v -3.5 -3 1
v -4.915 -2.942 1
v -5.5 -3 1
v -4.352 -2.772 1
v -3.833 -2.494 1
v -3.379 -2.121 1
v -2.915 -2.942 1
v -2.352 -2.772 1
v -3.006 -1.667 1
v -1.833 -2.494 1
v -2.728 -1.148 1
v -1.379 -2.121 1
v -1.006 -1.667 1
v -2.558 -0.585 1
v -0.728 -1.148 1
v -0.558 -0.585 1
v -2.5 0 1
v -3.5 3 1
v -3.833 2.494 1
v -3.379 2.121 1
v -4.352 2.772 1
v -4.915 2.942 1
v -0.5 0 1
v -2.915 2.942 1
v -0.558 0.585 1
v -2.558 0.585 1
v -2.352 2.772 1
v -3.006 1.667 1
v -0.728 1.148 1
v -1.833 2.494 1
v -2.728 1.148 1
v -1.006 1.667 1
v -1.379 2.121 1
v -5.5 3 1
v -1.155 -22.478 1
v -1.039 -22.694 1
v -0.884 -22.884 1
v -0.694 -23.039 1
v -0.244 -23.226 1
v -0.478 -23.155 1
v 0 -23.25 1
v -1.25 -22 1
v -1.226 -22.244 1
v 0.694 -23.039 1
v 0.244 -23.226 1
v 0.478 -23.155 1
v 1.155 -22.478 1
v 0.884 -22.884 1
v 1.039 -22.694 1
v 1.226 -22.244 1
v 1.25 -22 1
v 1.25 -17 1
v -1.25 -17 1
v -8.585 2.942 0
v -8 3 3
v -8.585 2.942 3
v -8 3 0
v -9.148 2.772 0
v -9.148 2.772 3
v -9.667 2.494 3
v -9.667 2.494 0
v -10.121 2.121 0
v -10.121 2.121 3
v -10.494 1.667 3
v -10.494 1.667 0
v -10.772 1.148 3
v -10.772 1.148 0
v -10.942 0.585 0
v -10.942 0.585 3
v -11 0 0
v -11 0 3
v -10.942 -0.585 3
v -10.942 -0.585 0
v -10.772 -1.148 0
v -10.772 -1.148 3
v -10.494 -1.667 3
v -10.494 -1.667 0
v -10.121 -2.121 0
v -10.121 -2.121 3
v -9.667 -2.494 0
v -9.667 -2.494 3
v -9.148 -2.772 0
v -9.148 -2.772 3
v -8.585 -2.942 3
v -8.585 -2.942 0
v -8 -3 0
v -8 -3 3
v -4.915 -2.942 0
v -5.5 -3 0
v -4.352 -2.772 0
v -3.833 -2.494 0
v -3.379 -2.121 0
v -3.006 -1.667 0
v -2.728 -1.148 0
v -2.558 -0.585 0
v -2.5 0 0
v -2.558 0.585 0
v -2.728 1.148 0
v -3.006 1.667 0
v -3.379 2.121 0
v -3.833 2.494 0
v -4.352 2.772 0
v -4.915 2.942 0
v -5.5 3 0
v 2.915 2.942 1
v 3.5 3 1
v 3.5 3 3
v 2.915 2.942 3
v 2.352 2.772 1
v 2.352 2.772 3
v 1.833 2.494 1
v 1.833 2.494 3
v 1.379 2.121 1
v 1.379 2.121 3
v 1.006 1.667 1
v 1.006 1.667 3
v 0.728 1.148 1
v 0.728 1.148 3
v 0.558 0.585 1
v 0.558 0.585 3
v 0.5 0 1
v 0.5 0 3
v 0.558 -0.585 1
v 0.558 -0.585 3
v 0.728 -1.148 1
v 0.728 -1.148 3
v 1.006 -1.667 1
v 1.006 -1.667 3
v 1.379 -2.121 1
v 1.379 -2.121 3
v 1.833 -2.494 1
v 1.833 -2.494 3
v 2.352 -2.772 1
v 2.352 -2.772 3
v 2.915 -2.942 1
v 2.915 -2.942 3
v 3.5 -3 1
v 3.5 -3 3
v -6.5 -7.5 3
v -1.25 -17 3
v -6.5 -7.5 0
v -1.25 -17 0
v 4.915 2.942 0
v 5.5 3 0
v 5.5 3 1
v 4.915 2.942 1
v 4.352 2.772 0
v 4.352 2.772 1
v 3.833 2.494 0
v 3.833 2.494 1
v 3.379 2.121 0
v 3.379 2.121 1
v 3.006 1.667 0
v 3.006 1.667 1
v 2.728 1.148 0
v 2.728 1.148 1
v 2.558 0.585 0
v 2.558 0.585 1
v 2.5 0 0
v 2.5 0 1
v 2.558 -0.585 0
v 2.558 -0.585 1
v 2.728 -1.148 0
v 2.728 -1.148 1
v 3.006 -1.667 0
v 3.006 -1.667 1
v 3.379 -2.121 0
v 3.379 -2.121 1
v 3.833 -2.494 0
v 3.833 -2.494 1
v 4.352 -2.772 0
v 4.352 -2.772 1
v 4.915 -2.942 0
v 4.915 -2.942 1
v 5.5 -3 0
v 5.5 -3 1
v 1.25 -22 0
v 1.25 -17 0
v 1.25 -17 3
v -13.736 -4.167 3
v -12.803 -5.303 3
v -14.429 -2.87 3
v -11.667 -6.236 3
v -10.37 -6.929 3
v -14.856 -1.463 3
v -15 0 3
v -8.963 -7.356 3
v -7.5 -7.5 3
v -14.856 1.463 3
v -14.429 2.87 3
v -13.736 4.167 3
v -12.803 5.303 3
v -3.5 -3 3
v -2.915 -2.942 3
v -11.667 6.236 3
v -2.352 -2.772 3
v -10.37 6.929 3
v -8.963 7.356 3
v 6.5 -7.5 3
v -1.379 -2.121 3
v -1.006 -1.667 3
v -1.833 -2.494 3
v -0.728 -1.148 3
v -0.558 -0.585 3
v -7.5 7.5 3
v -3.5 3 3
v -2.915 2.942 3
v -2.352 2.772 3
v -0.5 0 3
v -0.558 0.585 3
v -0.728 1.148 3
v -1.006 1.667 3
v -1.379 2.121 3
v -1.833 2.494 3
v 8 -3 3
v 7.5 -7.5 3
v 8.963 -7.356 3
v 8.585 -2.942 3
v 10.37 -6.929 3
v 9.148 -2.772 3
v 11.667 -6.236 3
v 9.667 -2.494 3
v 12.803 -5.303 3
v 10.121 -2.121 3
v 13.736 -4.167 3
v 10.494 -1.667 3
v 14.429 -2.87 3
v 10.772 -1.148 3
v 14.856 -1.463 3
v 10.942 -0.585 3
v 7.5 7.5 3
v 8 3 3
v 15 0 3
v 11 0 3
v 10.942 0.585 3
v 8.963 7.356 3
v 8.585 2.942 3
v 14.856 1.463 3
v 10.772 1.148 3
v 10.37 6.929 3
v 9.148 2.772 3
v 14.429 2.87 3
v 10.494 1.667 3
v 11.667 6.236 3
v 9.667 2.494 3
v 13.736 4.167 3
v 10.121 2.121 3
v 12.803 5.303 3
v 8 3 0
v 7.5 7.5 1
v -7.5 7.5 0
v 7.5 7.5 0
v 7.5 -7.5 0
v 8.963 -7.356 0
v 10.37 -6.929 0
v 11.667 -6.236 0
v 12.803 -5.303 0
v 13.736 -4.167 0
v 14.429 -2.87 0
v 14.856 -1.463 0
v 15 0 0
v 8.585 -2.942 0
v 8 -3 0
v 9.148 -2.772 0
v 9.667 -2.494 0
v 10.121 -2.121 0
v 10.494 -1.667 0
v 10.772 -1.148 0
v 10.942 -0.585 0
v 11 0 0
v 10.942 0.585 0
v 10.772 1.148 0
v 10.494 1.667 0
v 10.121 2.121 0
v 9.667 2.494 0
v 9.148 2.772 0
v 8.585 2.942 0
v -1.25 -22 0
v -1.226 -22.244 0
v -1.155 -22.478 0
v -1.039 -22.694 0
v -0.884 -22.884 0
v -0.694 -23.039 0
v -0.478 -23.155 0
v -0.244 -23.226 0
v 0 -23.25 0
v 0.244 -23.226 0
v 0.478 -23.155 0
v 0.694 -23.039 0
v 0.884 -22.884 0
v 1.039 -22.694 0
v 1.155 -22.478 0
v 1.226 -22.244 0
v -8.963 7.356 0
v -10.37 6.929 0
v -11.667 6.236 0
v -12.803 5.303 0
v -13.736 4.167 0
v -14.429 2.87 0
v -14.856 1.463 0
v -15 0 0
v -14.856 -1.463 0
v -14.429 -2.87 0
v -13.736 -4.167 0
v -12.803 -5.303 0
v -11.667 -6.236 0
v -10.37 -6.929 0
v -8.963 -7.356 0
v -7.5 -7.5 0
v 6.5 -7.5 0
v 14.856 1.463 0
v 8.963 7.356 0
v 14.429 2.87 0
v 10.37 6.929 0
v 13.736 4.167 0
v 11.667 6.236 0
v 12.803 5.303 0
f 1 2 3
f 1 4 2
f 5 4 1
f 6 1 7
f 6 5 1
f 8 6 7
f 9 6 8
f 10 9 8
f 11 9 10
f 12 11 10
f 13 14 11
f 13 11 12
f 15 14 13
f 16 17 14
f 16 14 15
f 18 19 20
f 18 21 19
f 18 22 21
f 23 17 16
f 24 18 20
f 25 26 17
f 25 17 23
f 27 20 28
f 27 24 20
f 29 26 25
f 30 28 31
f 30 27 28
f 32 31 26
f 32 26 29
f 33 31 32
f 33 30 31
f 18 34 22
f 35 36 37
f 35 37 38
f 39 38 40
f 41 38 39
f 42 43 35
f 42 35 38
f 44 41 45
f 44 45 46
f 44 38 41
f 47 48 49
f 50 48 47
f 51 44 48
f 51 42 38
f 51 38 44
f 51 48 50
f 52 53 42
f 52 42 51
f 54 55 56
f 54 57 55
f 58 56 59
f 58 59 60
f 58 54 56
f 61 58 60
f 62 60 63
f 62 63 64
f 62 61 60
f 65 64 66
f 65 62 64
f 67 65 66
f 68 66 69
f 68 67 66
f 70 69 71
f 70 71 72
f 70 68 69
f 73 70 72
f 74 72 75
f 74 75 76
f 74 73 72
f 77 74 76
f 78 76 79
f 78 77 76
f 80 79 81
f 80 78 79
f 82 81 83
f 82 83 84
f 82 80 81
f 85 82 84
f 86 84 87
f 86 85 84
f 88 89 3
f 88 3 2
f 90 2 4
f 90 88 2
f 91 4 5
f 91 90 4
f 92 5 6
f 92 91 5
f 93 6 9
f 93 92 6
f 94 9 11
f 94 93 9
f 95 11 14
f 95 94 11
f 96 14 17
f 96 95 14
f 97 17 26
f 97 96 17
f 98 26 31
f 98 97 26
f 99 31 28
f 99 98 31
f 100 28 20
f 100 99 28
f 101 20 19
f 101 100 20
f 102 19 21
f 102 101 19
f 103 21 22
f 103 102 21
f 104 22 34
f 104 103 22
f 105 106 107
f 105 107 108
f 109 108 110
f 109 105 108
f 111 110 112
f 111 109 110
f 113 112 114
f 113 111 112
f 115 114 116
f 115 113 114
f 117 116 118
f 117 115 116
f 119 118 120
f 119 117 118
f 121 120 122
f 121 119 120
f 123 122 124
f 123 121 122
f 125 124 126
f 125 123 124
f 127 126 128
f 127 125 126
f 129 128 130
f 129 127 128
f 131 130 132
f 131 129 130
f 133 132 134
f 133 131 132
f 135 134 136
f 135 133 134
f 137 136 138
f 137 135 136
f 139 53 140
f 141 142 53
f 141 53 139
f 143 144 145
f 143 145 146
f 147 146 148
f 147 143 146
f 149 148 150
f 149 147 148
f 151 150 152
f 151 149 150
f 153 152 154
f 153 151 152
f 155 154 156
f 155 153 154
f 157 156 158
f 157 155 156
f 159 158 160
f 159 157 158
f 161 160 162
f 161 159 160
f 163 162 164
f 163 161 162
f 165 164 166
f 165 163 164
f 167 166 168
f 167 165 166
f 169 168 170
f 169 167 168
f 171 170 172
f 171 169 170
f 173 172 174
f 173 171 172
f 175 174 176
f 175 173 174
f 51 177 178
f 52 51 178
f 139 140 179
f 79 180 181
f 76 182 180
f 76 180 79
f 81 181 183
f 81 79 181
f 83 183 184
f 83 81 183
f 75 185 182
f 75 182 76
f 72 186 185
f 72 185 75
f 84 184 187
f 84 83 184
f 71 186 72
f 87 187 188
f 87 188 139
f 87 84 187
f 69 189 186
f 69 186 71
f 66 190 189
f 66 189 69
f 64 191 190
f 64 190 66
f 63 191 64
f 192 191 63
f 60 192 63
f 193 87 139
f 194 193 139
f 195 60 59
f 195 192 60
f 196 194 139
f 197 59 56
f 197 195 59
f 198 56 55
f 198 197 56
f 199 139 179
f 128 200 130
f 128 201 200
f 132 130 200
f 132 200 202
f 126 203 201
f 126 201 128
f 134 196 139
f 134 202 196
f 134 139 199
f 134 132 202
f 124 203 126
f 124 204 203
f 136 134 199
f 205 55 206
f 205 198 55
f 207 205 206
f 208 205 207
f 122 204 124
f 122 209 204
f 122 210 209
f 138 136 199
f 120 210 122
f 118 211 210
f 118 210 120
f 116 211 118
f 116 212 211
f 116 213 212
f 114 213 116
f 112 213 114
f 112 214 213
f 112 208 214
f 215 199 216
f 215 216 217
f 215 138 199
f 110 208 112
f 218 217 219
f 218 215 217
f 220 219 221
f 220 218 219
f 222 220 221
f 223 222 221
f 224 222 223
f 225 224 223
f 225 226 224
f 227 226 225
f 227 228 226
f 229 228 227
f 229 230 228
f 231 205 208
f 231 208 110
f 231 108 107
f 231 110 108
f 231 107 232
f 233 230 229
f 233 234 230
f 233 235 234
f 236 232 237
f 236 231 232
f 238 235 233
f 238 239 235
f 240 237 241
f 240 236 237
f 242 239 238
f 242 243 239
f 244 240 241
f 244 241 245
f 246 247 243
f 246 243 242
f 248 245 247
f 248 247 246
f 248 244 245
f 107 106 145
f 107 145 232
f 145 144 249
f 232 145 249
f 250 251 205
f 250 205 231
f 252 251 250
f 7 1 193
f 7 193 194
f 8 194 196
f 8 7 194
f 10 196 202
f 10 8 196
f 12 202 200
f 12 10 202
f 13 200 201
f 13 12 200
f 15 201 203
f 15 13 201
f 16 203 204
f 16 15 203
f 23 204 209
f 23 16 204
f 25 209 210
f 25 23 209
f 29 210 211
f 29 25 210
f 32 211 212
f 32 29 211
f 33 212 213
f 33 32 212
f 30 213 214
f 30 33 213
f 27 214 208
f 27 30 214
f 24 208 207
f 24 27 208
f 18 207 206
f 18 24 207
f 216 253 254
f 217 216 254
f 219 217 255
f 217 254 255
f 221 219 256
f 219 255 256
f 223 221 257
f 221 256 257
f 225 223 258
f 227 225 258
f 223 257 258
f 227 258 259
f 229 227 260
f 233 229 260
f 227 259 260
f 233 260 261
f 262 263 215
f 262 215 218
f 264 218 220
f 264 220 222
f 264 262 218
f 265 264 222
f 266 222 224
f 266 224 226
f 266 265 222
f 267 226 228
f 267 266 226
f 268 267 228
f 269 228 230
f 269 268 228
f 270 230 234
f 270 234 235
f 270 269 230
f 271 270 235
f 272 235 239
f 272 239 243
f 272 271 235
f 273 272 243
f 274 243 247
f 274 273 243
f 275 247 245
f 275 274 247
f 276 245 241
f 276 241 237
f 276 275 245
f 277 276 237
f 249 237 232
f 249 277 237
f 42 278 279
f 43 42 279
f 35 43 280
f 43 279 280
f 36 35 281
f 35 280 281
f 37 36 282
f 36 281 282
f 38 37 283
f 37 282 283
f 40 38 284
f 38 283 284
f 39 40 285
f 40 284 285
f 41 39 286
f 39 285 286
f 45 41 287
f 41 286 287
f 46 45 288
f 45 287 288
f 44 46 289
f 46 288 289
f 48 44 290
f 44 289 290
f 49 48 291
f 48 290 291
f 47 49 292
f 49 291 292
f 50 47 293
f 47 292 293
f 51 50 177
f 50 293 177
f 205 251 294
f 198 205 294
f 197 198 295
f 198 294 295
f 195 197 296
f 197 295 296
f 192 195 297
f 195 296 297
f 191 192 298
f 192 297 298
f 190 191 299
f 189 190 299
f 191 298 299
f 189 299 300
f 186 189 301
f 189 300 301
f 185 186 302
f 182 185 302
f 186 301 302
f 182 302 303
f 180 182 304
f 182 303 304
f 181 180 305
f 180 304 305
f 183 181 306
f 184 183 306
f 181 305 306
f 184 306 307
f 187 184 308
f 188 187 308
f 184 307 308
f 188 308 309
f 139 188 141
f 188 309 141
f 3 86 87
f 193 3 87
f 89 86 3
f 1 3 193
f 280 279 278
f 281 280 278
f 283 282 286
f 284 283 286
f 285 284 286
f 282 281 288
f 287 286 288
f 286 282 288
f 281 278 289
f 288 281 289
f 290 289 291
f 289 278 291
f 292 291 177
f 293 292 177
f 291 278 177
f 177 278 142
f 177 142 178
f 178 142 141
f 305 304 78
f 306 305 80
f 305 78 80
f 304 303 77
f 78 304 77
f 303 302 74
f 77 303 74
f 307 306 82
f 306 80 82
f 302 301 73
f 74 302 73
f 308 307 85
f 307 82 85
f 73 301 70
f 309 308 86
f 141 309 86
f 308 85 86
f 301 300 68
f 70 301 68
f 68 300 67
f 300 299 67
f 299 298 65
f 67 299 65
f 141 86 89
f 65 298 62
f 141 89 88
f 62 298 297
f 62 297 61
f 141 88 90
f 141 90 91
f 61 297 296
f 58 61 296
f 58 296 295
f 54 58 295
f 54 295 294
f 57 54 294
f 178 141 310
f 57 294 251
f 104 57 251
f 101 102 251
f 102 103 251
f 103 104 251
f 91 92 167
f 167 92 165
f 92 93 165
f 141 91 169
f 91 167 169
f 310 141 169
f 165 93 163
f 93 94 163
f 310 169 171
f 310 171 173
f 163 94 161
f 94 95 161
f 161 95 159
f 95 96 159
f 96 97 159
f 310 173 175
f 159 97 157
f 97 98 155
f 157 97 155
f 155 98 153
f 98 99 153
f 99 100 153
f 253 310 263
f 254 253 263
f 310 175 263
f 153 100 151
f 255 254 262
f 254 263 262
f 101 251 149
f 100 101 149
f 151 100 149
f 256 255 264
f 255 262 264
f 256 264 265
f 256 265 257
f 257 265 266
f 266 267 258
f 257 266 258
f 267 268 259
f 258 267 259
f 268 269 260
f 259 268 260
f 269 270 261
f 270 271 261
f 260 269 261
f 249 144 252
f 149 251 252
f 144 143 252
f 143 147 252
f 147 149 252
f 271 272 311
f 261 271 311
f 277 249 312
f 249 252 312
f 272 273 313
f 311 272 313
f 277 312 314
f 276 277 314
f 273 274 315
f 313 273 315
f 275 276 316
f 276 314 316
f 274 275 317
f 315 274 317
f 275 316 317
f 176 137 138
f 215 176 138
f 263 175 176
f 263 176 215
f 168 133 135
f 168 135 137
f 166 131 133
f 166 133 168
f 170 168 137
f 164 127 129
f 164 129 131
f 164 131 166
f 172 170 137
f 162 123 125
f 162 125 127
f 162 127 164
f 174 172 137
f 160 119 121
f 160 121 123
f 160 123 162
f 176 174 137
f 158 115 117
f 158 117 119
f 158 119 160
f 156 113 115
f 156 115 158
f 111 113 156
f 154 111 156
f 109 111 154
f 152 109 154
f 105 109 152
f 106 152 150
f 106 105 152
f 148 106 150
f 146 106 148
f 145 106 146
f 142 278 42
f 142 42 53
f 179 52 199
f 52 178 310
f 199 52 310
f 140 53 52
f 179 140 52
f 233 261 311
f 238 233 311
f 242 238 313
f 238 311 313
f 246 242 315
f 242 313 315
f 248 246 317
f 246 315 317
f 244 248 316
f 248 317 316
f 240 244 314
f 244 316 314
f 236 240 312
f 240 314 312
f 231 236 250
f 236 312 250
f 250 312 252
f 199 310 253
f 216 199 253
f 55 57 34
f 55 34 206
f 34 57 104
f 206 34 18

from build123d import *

# Parameters (mm, degrees)
PAD_DEPTH    = 1
PAD001_DEPTH = 2


with BuildPart() as part:
    # Sketch → Pad (new body)
    with BuildSketch(Plane.XY):
        with BuildLine():
            ThreePointArc((-7.5, 7.5), (-15, 0), (-7.5, -7.5))
            Line((-7.5, -7.5), (-6.5, -7.5))
            Line((-1.25, -17), (-6.5, -7.5))
            Line((-1.25, -22), (-1.25, -17))
            ThreePointArc((-1.25, -22), (0, -23.25), (1.25, -22))
            Line((1.25, -22), (1.25, -17))
            Line((1.25, -17), (6.5, -7.5))
            Line((6.5, -7.5), (7.5, -7.5))
            ThreePointArc((7.5, -7.5), (12.803301, -5.303301), (15, 0))
            ThreePointArc((15, 0), (12.803311, 5.303291), (7.500028, 7.5))
            Line((-7.5, 7.5), (7.500028, 7.5))
        make_face()
        with BuildLine():
            ThreePointArc((-8, 3), (-11, 0), (-8, -3))
            Line((-8, -3), (-5.5, -3))
            ThreePointArc((-5.5, -3), (-2.5, 0), (-5.5, 3))
            Line((-8, 3), (-5.5, 3))
        make_face(mode=Mode.SUBTRACT)
        with BuildLine():
            ThreePointArc((5.5, 3), (2.5, 0), (5.5, -3))
            Line((5.5, -3), (8, -3))
            ThreePointArc((8, -3), (11, 0), (8, 3))
            Line((5.5, 3), (8, 3))
        make_face(mode=Mode.SUBTRACT)
    extrude(amount=PAD_DEPTH)

    # Sketch001 (on Face21 of Pad) → Pad001 (join)
    with BuildSketch(Plane.XY.offset(1)):
        with BuildLine():
            ThreePointArc((-7.5, 7.5), (-15, 0), (-7.5, -7.5))
            Line((-7.5, -7.5), (-6.5, -7.5))
            Line((-1.25, -17), (-6.5, -7.5))
            Line((-1.25, -17), (1.25, -17))
            Line((1.25, -17), (6.5, -7.5))
            Line((6.5, -7.5), (7.5, -7.5))
            ThreePointArc((7.5, -7.5), (12.803301, -5.303301), (15, 0))
            ThreePointArc((15, 0), (12.803291, 5.303311), (7.499972, 7.5))
            Line((-7.5, 7.5), (7.499972, 7.5))
        make_face()
        with BuildLine():
            ThreePointArc((-8, 3), (-11, 0), (-8, -3))
            Line((-8, -3), (-3.5, -3))
            ThreePointArc((-3.5, -3), (-0.5, 0), (-3.5, 3))
            Line((-8, 3), (-3.5, 3))
        make_face(mode=Mode.SUBTRACT)
        with BuildLine():
            ThreePointArc((3.5, 3), (0.5, 0), (3.5, -3))
            Line((3.5, -3), (8, -3))
            ThreePointArc((8, -3), (11, 0), (8, 3))
            Line((3.5, 3), (8, 3))
        make_face(mode=Mode.SUBTRACT)
    extrude(amount=PAD001_DEPTH)


solid = part.part
